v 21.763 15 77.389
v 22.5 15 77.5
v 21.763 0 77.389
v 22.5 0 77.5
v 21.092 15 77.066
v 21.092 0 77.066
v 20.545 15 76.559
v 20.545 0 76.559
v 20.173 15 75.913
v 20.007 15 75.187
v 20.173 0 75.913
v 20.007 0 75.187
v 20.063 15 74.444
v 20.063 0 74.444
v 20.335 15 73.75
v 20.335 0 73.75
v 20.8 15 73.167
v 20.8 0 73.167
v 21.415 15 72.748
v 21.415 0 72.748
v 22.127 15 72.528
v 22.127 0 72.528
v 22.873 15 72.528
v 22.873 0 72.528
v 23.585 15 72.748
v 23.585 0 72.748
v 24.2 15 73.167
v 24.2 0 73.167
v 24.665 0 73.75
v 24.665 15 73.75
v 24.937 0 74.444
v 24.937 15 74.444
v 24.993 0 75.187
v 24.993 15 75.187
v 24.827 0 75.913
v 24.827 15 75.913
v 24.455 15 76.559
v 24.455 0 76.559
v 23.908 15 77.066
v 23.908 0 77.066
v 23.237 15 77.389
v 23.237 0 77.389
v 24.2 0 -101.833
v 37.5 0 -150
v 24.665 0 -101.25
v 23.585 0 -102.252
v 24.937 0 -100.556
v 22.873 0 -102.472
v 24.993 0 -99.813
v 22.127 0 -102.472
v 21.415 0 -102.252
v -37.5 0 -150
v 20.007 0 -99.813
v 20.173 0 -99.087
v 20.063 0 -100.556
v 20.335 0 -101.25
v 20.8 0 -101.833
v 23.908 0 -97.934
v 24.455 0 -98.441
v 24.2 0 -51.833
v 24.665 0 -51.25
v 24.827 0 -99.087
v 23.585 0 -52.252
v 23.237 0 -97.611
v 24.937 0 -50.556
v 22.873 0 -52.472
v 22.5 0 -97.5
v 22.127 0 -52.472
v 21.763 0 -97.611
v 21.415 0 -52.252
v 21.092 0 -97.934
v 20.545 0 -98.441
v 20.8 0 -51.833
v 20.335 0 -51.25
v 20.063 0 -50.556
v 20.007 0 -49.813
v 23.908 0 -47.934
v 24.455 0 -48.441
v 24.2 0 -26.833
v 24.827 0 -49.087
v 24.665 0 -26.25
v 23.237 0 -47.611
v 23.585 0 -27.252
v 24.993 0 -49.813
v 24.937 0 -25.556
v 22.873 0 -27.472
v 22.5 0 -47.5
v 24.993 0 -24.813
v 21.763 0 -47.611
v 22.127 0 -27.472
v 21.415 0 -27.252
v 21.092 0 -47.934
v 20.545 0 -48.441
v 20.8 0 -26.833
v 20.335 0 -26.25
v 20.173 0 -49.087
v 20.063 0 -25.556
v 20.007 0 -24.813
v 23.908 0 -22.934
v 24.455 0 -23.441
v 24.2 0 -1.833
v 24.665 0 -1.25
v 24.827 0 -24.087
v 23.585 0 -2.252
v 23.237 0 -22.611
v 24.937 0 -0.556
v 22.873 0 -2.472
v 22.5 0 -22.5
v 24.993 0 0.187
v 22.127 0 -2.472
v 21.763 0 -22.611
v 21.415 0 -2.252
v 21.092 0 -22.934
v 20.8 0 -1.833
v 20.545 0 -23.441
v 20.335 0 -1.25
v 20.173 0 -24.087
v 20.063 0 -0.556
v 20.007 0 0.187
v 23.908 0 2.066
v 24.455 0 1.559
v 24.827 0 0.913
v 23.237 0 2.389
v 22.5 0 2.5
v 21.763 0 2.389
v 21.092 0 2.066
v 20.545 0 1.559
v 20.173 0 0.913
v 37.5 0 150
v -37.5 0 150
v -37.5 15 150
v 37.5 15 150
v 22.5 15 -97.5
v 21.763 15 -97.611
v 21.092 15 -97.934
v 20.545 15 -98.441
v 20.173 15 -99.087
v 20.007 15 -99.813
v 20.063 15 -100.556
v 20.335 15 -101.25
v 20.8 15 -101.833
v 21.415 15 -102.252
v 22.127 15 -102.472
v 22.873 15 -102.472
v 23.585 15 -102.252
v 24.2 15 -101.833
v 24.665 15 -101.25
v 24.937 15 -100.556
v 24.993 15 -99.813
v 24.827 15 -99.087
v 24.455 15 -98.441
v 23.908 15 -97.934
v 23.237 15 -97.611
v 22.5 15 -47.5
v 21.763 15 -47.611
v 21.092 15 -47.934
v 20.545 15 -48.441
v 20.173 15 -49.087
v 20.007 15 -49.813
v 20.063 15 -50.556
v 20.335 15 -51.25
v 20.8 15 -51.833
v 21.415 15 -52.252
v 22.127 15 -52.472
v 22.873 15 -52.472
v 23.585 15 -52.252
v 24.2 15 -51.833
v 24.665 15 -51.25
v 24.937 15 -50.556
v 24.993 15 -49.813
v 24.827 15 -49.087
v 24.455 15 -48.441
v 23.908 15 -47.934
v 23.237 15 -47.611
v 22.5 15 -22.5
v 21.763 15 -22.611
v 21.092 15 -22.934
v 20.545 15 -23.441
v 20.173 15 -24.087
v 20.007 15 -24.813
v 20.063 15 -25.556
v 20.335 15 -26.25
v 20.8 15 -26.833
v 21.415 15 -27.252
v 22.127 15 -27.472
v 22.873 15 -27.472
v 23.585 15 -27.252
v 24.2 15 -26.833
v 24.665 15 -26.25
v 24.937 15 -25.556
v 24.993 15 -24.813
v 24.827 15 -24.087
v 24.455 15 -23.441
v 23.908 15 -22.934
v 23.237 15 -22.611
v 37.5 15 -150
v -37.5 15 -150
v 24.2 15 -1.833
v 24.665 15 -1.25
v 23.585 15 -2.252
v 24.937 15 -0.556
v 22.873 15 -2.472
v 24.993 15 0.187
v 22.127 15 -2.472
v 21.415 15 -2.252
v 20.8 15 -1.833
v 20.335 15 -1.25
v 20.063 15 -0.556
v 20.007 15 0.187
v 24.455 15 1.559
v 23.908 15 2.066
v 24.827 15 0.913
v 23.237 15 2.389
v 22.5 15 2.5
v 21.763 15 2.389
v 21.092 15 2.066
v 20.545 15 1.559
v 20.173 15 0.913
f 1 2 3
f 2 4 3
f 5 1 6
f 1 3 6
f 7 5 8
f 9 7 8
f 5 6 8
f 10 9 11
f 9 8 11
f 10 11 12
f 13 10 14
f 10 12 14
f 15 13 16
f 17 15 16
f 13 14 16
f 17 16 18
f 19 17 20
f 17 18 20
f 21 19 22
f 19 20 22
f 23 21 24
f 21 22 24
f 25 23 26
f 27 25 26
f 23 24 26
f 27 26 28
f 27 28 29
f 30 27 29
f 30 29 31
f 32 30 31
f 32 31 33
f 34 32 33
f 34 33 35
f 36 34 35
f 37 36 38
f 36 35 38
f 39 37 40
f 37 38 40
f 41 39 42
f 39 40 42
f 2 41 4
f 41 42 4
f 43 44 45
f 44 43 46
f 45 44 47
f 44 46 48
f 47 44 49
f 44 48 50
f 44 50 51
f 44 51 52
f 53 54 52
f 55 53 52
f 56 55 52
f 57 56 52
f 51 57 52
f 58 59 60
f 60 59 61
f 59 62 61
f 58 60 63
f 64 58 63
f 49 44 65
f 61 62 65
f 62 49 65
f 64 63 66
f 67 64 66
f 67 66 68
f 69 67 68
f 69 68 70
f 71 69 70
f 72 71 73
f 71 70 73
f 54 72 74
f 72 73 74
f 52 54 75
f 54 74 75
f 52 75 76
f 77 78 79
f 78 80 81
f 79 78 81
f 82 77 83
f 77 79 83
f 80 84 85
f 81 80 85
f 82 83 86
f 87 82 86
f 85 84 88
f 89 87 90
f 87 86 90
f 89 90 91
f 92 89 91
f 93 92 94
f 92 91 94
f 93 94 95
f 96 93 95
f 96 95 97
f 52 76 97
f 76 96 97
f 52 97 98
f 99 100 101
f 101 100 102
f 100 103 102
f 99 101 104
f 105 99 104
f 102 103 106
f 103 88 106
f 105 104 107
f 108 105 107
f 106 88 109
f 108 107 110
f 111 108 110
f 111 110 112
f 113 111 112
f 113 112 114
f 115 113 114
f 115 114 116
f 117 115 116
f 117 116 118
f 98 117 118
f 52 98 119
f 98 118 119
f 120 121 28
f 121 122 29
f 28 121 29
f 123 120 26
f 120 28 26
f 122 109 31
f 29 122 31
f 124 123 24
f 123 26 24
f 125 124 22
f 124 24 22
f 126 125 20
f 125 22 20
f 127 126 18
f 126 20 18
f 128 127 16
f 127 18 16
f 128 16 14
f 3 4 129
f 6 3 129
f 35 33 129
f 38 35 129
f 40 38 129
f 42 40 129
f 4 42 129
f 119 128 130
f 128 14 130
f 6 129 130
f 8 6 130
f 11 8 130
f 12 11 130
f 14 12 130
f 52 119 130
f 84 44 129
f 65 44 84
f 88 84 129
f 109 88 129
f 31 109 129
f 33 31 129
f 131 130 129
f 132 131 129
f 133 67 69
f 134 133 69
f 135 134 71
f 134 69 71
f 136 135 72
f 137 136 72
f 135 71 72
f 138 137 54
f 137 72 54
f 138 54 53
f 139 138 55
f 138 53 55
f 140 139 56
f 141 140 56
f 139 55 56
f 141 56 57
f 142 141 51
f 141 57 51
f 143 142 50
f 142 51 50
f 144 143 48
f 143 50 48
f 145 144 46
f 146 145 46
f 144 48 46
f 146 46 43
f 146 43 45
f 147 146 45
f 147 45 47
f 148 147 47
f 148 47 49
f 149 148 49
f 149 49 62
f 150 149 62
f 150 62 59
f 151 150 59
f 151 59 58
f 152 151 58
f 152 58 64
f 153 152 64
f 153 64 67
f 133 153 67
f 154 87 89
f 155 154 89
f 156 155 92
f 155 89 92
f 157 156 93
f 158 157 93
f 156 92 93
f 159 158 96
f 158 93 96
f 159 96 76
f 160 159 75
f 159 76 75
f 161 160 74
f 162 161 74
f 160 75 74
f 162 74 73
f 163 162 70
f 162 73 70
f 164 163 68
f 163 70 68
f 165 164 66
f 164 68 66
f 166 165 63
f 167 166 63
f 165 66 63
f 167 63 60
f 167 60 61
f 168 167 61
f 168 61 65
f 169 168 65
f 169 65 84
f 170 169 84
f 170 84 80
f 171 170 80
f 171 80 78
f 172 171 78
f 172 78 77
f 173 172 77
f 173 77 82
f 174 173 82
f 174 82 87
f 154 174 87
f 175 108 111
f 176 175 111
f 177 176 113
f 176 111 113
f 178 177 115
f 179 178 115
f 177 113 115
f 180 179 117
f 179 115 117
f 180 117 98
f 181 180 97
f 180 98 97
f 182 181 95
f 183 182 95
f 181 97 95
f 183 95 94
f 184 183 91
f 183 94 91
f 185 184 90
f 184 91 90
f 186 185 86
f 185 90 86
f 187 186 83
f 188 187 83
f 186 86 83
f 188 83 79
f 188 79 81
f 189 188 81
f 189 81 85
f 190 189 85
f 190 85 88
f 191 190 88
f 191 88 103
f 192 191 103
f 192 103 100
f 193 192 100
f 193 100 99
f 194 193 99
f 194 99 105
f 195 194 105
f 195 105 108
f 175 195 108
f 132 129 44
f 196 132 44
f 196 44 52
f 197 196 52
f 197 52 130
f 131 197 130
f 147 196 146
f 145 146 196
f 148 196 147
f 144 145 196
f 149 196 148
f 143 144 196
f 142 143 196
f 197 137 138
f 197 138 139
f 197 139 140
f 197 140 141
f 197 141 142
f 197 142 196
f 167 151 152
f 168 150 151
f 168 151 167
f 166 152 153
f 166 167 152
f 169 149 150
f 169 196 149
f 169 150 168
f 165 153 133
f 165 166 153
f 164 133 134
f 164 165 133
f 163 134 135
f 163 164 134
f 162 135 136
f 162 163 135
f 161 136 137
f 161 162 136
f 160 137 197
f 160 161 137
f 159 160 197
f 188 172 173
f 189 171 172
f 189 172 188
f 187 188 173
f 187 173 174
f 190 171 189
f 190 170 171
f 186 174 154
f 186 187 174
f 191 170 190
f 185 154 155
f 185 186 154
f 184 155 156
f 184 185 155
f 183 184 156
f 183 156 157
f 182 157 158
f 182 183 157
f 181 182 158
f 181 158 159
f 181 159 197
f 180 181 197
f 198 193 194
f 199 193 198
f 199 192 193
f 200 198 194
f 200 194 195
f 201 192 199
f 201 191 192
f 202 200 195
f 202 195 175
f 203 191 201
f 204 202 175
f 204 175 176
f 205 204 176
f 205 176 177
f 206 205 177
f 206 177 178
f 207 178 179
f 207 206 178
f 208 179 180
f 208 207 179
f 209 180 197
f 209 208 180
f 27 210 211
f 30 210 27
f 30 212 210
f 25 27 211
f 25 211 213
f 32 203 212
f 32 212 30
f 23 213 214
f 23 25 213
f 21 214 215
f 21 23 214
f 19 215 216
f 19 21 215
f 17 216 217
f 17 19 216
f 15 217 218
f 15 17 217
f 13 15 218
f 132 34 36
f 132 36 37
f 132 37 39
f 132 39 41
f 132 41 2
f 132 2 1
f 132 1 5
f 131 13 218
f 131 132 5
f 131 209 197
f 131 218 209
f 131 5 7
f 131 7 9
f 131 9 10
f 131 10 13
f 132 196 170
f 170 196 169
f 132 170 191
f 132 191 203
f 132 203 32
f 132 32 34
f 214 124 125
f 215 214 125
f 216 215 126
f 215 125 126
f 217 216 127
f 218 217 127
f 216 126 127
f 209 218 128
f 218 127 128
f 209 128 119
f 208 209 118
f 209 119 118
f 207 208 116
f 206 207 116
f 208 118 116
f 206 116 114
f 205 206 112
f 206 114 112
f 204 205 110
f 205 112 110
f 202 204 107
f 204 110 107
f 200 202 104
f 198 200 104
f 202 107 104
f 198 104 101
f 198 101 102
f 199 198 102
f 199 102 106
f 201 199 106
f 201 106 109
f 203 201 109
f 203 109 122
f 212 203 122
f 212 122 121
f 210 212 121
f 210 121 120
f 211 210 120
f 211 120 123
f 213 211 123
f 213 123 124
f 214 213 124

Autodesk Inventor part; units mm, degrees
sketch "Sketch1" plane through (0, 0, 0) normal (0, 1, 0) x (-1, 0, 0)
  line L0 (37.5, 150) -> (-37.5, 150)
  line L1 (-37.5, 150) -> (-37.5, -150)
  line L2 (-37.5, -150) -> (37.5, -150)
  line L3 (37.5, -150) -> (37.5, 150)
  line L4 (37.5, 150) -> (-37.5, -150) construction
  line L5 (-37.5, 150) -> (37.5, -150) construction
  point P0 (0, 0)
  dimension "d0" = 75
  dimension "d1" = 300
extrude "Extrusion1" add sketch "Sketch1" along normal blind 15
sketch "Sketch2" plane through (0, 15, 0) normal (0, 1, 0) x (1, 0, 0)
  line L0 (37.5, -150) -> (37.5, 150) projected
  line L1 (37.5, 150) -> (-37.5, 150) projected
  point P0 (0, 0)
  point P1 (22.5, 100)
  dimension "d11" = 15
  dimension "d12" = 50
hole "Hole1" at (22.5, 15, -100) direction (0, -1, 0) diameter 5 end through all
pattern_linear "Rectangular Pattern1" count 2 spacing 50 along (0, 0, 1) of "Hole1"
pattern_linear "Rectangular Pattern2" count 2 spacing 75 along (0, 0, 1) of "Hole1"
pattern_linear "Rectangular Pattern3" count 2 spacing 100 along (0, 0, 1) of "Hole1", "Rectangular Pattern2"
properties part number "PrinterHeadLip_RightSide"
